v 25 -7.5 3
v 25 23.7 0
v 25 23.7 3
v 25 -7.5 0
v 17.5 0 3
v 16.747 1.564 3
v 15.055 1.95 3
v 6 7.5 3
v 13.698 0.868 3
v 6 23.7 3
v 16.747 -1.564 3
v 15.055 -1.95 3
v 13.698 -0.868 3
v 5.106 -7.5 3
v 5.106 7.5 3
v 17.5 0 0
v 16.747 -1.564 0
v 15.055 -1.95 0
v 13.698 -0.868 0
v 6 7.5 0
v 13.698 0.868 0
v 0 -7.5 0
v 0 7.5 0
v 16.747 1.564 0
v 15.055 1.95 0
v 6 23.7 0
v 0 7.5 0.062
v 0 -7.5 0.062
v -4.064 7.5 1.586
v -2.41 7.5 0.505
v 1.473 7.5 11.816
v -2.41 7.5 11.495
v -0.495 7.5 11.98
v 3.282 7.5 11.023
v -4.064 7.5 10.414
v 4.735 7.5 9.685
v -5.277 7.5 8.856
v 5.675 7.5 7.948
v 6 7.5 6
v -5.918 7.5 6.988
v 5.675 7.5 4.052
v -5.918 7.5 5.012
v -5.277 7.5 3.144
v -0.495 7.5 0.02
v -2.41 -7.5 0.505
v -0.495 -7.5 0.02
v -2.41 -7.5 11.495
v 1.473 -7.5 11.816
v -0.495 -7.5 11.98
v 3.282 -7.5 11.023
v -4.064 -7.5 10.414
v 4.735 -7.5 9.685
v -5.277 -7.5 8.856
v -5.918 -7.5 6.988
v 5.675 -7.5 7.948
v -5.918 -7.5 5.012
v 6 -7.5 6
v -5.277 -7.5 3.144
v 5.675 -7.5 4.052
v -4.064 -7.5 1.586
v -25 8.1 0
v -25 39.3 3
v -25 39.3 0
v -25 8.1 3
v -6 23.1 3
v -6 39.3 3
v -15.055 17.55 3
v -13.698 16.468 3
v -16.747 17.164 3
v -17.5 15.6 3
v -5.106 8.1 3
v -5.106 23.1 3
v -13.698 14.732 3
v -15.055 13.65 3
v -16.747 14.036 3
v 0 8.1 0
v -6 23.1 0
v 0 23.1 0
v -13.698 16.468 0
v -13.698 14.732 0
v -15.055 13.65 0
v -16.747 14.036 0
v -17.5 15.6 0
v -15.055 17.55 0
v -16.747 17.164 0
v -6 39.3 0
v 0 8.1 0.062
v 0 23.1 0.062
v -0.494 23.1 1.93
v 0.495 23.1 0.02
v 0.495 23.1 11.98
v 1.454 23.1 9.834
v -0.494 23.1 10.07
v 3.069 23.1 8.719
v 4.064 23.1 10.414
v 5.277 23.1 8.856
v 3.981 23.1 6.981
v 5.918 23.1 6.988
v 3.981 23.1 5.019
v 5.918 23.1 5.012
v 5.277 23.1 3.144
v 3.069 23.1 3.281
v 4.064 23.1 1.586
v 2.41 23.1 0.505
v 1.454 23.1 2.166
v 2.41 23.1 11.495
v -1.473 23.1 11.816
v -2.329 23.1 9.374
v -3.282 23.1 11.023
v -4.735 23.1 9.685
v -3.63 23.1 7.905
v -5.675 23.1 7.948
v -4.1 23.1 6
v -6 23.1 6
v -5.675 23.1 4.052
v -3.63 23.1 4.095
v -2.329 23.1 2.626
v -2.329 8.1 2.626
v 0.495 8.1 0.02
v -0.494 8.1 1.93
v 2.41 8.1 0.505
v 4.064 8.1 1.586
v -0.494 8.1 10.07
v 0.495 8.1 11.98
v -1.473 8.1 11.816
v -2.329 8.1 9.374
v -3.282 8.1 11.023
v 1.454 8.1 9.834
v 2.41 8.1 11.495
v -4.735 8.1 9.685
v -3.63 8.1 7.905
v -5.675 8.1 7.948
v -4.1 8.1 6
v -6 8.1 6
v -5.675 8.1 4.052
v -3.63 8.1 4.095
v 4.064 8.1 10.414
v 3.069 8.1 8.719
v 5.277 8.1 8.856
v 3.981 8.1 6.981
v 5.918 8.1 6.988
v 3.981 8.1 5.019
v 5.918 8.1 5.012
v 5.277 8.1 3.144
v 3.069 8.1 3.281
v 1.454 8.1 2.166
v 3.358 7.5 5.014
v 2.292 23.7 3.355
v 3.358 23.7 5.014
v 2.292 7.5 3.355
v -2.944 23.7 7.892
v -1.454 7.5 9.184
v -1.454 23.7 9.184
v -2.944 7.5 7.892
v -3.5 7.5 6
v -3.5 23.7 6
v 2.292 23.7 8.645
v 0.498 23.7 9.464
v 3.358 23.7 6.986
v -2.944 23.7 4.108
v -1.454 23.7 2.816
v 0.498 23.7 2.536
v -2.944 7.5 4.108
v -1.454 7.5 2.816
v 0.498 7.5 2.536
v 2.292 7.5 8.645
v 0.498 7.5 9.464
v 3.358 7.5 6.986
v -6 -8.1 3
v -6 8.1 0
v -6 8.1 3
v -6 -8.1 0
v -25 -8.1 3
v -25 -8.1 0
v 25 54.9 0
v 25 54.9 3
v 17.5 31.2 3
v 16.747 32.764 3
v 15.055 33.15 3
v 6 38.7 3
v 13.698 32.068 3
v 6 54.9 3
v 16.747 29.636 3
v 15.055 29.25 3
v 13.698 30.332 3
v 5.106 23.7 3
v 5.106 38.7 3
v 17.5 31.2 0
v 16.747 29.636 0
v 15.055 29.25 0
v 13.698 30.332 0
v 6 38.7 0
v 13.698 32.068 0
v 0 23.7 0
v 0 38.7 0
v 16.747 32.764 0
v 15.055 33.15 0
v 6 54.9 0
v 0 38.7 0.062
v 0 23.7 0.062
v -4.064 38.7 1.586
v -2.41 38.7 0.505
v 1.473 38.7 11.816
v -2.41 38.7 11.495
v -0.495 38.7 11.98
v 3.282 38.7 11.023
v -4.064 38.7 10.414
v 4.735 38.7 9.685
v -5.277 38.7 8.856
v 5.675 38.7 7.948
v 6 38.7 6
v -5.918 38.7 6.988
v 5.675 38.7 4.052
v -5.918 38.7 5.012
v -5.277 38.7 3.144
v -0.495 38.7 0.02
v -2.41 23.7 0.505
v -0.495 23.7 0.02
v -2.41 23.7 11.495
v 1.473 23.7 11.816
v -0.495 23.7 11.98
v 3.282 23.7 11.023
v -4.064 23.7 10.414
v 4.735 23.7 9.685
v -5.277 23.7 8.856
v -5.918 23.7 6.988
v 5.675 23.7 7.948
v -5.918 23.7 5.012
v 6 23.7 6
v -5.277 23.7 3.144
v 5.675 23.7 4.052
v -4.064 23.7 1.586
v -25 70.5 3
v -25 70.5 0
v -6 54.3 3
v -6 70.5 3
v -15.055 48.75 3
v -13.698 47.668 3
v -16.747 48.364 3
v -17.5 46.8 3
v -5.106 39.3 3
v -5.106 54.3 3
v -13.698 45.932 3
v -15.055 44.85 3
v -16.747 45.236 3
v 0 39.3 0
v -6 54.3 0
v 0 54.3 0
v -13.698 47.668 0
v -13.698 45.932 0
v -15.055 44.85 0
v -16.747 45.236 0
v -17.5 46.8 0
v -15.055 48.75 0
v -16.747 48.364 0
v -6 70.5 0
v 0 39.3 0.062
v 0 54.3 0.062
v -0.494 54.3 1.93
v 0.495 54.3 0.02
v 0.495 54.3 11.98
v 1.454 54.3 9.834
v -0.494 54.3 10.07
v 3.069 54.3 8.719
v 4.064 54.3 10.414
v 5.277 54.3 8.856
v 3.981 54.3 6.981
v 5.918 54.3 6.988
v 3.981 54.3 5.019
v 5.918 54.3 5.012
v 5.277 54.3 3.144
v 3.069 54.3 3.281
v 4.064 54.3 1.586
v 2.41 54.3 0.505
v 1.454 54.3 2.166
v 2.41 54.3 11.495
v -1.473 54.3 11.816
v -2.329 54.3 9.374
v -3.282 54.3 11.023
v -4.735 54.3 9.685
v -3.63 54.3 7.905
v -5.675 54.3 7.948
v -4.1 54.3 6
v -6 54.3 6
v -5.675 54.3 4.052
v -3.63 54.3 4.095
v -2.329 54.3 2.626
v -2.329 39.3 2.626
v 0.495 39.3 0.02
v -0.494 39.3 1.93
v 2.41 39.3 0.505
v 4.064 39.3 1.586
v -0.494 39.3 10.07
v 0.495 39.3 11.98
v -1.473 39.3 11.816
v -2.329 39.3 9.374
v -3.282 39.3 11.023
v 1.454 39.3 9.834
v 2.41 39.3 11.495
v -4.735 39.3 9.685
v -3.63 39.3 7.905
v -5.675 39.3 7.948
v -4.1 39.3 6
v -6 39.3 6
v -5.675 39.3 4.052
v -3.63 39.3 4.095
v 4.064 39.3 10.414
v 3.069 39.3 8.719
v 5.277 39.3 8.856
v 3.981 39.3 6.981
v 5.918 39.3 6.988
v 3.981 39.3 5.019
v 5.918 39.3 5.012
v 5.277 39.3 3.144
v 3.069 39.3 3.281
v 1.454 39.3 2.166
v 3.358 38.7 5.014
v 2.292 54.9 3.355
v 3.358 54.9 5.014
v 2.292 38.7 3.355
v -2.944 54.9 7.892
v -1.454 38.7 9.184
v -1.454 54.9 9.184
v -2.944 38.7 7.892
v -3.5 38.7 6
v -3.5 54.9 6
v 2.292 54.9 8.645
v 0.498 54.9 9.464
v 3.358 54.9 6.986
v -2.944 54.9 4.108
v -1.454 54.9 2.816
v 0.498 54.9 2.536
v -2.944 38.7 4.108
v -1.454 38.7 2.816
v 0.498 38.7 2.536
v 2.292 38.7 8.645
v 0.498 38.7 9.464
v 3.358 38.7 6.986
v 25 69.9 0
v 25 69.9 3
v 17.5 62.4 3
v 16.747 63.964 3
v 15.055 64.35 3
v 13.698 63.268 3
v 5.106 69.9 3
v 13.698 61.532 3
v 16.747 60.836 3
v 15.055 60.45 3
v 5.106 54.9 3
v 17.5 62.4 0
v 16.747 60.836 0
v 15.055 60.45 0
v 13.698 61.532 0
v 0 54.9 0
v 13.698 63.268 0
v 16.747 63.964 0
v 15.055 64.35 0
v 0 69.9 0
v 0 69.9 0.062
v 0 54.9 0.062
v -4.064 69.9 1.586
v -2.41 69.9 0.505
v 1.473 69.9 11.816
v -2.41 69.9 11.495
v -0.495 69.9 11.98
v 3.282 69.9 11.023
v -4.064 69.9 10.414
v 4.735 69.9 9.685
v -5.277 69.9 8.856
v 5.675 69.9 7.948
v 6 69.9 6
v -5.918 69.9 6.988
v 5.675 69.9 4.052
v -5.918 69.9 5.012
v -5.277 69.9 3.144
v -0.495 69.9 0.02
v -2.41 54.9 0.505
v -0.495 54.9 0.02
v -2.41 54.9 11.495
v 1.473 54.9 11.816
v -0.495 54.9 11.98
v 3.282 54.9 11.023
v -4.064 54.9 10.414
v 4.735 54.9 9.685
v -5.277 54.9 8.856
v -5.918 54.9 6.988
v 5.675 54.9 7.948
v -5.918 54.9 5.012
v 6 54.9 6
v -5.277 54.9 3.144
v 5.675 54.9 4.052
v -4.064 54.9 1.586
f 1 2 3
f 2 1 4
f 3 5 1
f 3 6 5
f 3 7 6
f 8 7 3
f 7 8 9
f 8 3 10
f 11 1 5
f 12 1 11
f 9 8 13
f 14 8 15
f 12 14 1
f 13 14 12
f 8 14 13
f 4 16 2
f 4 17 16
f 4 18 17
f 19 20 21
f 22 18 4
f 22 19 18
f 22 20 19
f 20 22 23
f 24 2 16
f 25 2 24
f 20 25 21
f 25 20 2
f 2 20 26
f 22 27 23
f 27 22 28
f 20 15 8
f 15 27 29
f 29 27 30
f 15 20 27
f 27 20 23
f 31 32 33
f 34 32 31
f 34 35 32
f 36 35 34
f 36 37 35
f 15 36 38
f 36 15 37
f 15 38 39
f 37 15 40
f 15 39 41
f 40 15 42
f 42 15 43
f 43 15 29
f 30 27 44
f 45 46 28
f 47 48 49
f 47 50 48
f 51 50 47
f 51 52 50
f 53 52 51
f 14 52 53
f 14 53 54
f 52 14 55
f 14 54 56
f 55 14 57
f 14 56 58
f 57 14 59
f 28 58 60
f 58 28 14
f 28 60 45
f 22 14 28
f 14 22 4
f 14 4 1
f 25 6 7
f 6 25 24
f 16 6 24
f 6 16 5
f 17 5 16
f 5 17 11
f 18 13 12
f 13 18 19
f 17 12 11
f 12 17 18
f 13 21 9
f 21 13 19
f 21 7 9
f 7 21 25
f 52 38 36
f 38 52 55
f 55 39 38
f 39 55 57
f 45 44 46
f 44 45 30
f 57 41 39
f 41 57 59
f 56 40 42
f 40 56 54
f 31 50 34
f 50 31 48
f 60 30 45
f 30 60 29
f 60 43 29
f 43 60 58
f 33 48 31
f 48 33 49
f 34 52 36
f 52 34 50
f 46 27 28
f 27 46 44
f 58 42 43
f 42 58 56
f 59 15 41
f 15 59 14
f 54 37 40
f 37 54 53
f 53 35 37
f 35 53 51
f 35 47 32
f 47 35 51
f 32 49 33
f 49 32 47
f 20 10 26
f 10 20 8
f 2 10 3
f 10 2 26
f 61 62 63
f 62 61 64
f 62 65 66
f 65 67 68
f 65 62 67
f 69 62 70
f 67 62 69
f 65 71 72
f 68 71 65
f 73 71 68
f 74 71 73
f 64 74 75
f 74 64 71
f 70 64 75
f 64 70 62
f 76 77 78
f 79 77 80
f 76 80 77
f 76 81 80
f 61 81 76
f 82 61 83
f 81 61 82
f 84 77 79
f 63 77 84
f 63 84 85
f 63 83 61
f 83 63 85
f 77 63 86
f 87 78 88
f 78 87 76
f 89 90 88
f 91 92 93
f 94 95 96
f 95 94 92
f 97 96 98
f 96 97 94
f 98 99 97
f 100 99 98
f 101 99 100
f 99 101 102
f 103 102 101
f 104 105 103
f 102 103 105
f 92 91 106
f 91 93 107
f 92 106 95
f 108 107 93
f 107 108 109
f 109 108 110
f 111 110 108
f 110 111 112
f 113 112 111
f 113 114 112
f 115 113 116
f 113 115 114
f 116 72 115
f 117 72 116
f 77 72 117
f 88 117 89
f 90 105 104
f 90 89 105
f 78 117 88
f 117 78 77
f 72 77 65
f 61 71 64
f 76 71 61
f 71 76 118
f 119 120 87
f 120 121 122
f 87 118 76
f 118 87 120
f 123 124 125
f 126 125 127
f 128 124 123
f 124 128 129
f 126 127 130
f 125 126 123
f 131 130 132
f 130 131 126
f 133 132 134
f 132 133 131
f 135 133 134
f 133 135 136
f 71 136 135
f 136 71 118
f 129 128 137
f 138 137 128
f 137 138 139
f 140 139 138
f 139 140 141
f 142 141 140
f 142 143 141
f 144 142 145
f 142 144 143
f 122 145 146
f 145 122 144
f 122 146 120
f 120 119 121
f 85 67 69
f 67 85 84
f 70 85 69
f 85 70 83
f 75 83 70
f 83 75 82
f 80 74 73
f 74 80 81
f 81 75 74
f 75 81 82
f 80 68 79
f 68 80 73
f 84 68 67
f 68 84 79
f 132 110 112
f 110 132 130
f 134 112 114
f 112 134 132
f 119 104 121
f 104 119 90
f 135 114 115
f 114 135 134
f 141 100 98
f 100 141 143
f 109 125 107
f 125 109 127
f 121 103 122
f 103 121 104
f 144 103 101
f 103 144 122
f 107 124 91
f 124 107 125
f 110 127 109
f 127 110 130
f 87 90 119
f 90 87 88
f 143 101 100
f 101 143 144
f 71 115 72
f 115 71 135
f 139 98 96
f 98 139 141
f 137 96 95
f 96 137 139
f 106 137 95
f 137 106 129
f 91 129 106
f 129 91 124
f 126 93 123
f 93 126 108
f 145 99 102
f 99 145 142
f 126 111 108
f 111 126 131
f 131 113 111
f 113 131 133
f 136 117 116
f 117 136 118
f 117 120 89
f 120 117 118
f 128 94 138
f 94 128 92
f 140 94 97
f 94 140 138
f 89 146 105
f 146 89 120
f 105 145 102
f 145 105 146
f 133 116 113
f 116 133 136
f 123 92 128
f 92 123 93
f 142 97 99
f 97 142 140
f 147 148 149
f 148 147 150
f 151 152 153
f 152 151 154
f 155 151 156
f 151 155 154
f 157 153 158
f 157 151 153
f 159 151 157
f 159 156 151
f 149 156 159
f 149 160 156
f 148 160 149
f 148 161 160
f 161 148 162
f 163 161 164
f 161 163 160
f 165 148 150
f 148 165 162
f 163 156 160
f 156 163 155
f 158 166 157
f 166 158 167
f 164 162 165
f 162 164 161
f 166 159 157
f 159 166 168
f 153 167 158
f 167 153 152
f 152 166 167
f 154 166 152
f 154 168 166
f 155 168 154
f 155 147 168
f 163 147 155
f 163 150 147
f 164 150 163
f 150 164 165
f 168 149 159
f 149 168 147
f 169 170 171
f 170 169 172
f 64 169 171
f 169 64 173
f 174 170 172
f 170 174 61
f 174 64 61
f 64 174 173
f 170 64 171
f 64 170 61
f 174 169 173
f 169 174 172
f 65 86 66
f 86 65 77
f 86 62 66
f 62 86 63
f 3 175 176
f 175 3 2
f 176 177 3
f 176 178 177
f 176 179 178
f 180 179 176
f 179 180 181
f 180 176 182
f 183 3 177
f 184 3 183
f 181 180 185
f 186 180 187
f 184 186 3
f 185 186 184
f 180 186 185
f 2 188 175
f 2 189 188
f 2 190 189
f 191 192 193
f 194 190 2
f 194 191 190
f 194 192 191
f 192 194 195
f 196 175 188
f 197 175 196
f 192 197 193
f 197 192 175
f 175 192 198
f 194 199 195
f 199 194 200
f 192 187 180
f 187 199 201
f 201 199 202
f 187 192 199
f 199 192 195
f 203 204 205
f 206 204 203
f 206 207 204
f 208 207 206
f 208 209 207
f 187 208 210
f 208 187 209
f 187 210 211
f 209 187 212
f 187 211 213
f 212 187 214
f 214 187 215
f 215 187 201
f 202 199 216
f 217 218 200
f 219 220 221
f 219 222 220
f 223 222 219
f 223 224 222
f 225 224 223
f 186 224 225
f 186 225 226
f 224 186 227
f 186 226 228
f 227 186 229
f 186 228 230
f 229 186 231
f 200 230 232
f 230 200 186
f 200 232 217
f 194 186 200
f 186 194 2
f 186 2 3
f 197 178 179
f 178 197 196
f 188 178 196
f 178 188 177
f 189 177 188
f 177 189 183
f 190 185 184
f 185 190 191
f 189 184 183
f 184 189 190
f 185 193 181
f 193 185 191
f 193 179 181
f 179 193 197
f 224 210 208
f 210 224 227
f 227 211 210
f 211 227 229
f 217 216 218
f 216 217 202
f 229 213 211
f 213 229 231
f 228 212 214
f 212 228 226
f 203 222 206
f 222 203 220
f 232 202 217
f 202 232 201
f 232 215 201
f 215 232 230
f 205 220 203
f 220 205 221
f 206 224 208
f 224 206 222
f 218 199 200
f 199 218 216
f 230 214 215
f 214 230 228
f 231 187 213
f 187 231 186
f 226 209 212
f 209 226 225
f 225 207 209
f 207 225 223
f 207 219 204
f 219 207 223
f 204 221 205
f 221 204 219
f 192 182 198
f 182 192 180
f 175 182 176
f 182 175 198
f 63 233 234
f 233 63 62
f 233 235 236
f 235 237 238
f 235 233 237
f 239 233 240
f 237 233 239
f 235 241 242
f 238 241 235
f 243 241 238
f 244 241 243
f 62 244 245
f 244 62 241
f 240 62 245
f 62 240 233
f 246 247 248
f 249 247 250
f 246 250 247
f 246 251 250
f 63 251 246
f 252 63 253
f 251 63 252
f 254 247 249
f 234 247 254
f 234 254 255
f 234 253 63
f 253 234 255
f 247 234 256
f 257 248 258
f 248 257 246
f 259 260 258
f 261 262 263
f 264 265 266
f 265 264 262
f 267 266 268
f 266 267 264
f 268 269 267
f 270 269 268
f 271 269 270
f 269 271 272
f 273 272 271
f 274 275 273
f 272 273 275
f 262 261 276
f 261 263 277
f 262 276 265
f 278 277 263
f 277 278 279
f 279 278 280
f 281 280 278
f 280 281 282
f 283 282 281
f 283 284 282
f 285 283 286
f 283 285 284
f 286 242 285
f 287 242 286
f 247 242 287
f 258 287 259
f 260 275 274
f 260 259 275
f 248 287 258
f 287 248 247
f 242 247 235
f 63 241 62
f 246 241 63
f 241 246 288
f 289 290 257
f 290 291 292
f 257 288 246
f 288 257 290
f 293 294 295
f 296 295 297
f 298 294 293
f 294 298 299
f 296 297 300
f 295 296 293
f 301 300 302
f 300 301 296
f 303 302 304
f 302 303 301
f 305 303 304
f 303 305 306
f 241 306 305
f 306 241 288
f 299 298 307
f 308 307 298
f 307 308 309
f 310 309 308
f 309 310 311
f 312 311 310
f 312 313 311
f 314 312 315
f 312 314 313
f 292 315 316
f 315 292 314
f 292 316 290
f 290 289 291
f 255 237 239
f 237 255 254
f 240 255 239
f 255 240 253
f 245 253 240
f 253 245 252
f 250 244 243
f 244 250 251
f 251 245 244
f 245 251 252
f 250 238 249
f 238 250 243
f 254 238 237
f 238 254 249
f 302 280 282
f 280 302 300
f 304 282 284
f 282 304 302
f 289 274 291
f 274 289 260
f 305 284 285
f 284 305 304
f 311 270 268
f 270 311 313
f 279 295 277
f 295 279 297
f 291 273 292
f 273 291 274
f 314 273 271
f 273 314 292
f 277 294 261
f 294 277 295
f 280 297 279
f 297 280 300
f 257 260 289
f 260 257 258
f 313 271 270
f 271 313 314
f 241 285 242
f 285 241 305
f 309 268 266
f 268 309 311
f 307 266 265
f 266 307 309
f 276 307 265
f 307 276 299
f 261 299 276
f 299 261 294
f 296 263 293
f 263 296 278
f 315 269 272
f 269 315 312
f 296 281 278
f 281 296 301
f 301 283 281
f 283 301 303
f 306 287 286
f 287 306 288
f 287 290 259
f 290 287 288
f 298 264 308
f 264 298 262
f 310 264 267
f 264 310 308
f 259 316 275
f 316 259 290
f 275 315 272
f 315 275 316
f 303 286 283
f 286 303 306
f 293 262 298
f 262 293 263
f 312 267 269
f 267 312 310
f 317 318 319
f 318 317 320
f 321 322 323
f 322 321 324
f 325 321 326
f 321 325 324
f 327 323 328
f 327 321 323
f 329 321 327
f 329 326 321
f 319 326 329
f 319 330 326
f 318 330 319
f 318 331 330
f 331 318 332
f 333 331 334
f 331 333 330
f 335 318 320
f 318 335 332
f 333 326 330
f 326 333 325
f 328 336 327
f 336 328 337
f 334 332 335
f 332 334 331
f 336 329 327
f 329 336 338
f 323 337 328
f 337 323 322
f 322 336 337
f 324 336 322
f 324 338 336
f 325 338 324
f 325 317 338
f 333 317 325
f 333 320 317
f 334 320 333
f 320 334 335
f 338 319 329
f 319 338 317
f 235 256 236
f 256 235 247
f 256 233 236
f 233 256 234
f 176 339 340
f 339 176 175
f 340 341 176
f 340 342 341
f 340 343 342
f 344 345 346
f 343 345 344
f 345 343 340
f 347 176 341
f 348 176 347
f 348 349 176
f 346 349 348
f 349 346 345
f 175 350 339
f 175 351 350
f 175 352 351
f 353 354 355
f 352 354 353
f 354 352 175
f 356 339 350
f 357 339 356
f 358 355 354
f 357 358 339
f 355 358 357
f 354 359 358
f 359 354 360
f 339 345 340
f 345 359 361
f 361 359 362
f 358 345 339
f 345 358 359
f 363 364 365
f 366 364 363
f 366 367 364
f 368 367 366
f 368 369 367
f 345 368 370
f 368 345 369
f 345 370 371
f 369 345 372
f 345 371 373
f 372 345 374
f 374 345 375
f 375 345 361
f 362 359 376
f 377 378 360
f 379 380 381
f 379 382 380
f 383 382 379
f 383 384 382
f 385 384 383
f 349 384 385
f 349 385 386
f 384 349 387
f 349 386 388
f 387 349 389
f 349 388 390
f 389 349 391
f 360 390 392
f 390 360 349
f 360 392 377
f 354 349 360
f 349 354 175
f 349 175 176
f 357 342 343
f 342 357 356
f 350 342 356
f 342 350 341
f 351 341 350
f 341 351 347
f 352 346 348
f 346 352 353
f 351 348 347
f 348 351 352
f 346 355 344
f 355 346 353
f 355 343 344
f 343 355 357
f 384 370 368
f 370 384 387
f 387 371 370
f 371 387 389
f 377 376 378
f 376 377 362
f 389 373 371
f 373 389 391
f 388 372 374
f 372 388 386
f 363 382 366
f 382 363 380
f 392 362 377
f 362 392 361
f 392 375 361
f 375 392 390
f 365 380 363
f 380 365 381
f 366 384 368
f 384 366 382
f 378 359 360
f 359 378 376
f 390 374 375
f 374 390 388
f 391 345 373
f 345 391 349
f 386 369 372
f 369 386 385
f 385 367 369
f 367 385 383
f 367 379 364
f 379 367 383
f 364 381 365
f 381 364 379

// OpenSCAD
/*[Link]*/
LinkRadius = 6;
//This is the length of each link, consider that this is the distance that your printer needs to be able to bridge.
LinkLength = 15;
//The thicker, the sturdier the overall hinge. Obiously InnerShaft + Inner Tolerance should never be bigger than Link Radius.
InnerShaft = 3.5;
//Depends on your printer/material, .6 worked well for me (this is the distance between the inner shaft and the inner layers of the links)
InnerTolerance = .6;
//Spacing between the links, i found .6mm to give good results
Spacing = .6;
//LinkNumber * LinkLength = the total length of your hinge.
LinkNumber = 5;
/*[Tabs]*/
TabLength0 = 25;
TabLength = 25;
TabThickness = 3;
HoleDiameter=4;
HoleOffset0=0;
HoleOffset=0;
//Do you want 2 long tabs or multiple smaller ones? 0=Yes, 1=No
LongTab = 0;

TotalLength = (LinkNumber*LinkLength)+(Spacing*(LinkNumber-1));


module solidHinge(LinkRadius,LinkLength,TabLength,TabThickness){
    union(){
        rotate([90,0,0]) linear_extrude(height=LinkLength,center=true) translate([0,LinkRadius,0]) circle(LinkRadius);
        translate([TabLength/2,0,TabThickness/2]) 
        difference(){cube([TabLength,LinkLength,TabThickness],center=true);
            translate([LinkRadius/2+HoleOffset,0,0])cylinder(h=TabThickness,r=HoleDiameter/2,center=true);
        }
    }
}


module hollowHinge(LinkRadius,LinkLength,TabLength,TabThickness,Spacing,InnerTolerance,InnerShaft){
    union(){
        difference(){
            union(){
                rotate([90,0,0]) linear_extrude(height=LinkLength,center=true) translate([0,LinkRadius,0]) circle(LinkRadius);
                translate([TabLength0/2,0,TabThickness/2]) 
                difference(){cube([TabLength0,LinkLength,TabThickness],center=true);
                translate([LinkRadius/2+HoleOffset0,0,0])cylinder(h=TabThickness,r=HoleDiameter/2,center=true);
                }
            }
            rotate([90,0,0]) linear_extrude(height=LinkLength+Spacing,center=true) translate([0,LinkRadius,0]) circle(InnerShaft+InnerTolerance,center=true);
        }
        rotate([90,0,0]) linear_extrude(height=LinkLength+(Spacing*2),center=true) translate([0,LinkRadius,0]) circle(InnerShaft,center=true);
    }
}

module CompleteHinge(LinkRadius,LinkLength,TabLength,TabThickness,Spacing,InnerTolerance,InnerShaft,LongTab,LinkNumber){
    
    union(){
        for(a=[0:LinkNumber-1]){
            if(a%2!=0){
                union(){
                mirror(1,0,0) translate([0,(LinkLength+(Spacing))*a,0]) hollowHinge(LinkRadius,LinkLength,TabLength,TabThickness,Spacing,InnerTolerance,InnerShaft); 
                   if(LongTab==0 && a!=LinkNumber-1){
                       if(a==1){
                       translate([-TabLength0/2-LinkRadius/2,0,TabThickness/2]) cube([TabLength0-LinkRadius,LinkLength+(Spacing*2),TabThickness],center=true);
                       }
                    translate([-TabLength0/2-LinkRadius/2,(LinkLength+(Spacing))*(a+1),TabThickness/2]) cube([TabLength0-LinkRadius,LinkLength+(Spacing*2),TabThickness],center=true); }
                } 
            }
            else{
                union(){
                translate([0,(LinkLength+(Spacing))*a,0]) solidHinge(LinkRadius,LinkLength,TabLength,TabThickness);
                    if(LongTab==0 && a!=LinkNumber-1){
                    translate([TabLength/2+LinkRadius/2,(LinkLength+(Spacing))*(a+1),TabThickness/2]) cube([TabLength-LinkRadius,LinkLength+(Spacing*2),TabThickness],center=true); }
                }             
            }
            if(LinkNumber%2==0){
                if(a==LinkNumber-1){
                    translate([0,((LinkLength+(Spacing))*a)+(LinkLength/2)+Spacing+(LinkLength/20),0]) rotate([90,0,0]) linear_extrude(height=LinkLength/10,center=true) translate([0,LinkRadius,0]) circle(LinkRadius); 
                }
            }
        }
        /*if(LongTab==0){
            color("blue",1) translate([(TabLength+LinkRadius)/2,(TotalLength/2)-(LinkLength/2)]) linear_extrude(height=TabThickness)square([(TabLength-LinkRadius),TotalLength],center=true);                
            color("blue",1) color("blue",1) translate([-(TabLength0+LinkRadius)/2,(TotalLength/2)-(LinkLength/2)]) linear_extrude(height=TabThickness)square([(TabLength0-LinkRadius),TotalLength],center=true);
        }*/
    }
    
}

CompleteHinge(LinkRadius,LinkLength,TabLength,TabThickness,Spacing,InnerTolerance,InnerShaft,LongTab,LinkNumber);
//hollowHinge(LinkRadius,LinkLength,TabLength,TabThickness,Spacing,InnerTolerance,InnerShaft);
